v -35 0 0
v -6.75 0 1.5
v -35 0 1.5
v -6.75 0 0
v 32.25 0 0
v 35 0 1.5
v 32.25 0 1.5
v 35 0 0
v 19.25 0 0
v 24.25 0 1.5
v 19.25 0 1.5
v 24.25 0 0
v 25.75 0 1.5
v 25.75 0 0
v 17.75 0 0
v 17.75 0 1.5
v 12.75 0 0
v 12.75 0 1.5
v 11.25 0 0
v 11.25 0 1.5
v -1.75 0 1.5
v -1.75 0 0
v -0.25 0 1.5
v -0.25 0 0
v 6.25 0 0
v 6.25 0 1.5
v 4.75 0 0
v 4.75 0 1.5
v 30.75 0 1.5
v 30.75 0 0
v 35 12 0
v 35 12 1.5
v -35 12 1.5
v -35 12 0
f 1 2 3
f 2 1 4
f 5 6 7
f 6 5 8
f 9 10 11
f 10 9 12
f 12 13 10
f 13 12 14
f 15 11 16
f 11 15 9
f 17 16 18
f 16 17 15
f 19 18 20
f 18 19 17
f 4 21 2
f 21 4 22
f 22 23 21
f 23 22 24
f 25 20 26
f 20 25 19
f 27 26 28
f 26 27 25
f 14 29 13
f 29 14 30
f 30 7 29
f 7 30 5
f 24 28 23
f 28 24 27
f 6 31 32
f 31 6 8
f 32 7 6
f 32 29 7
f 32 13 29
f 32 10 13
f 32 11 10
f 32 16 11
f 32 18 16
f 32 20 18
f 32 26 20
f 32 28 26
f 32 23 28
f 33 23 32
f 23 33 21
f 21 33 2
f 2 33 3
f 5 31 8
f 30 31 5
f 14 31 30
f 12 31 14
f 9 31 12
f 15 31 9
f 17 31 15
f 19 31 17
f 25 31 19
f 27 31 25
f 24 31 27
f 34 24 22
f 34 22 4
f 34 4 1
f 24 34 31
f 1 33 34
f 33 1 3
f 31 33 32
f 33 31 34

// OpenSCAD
// 10-well agarose gel comb - printed lying flat
// Units: mm

$fn = 64;

// ---- Dimensions ----
spine_len    = 70;    // spine length (X)
spine_wid    = 12;    // spine width (Y)
tooth_w      = 5.0;   // tooth width (X)
tooth_len    = 12;    // tooth length (Y)
tooth_count  = 10;    // number of teeth
gap          = 1.5;   // tooth gap (X)
plate_t      = 1.5;   // plate thickness (Z)
eps          = 0.5;   // cutter overshoot

// ---- Derived ----
pitch   = tooth_w + gap;
x_start = -(tooth_count - 1) * gap / 2;

// ---- Model ----
difference() {
    // Spine
    translate([-spine_len/2, 0, 0])
        cube([spine_len, spine_wid, plate_t]);

    // Teeth
    for (i = [0 : tooth_count - 1])
        translate([x_start + i * pitch, -tooth_len, 0])
            cube([tooth_w, tooth_len, plate_t + eps]);
}
